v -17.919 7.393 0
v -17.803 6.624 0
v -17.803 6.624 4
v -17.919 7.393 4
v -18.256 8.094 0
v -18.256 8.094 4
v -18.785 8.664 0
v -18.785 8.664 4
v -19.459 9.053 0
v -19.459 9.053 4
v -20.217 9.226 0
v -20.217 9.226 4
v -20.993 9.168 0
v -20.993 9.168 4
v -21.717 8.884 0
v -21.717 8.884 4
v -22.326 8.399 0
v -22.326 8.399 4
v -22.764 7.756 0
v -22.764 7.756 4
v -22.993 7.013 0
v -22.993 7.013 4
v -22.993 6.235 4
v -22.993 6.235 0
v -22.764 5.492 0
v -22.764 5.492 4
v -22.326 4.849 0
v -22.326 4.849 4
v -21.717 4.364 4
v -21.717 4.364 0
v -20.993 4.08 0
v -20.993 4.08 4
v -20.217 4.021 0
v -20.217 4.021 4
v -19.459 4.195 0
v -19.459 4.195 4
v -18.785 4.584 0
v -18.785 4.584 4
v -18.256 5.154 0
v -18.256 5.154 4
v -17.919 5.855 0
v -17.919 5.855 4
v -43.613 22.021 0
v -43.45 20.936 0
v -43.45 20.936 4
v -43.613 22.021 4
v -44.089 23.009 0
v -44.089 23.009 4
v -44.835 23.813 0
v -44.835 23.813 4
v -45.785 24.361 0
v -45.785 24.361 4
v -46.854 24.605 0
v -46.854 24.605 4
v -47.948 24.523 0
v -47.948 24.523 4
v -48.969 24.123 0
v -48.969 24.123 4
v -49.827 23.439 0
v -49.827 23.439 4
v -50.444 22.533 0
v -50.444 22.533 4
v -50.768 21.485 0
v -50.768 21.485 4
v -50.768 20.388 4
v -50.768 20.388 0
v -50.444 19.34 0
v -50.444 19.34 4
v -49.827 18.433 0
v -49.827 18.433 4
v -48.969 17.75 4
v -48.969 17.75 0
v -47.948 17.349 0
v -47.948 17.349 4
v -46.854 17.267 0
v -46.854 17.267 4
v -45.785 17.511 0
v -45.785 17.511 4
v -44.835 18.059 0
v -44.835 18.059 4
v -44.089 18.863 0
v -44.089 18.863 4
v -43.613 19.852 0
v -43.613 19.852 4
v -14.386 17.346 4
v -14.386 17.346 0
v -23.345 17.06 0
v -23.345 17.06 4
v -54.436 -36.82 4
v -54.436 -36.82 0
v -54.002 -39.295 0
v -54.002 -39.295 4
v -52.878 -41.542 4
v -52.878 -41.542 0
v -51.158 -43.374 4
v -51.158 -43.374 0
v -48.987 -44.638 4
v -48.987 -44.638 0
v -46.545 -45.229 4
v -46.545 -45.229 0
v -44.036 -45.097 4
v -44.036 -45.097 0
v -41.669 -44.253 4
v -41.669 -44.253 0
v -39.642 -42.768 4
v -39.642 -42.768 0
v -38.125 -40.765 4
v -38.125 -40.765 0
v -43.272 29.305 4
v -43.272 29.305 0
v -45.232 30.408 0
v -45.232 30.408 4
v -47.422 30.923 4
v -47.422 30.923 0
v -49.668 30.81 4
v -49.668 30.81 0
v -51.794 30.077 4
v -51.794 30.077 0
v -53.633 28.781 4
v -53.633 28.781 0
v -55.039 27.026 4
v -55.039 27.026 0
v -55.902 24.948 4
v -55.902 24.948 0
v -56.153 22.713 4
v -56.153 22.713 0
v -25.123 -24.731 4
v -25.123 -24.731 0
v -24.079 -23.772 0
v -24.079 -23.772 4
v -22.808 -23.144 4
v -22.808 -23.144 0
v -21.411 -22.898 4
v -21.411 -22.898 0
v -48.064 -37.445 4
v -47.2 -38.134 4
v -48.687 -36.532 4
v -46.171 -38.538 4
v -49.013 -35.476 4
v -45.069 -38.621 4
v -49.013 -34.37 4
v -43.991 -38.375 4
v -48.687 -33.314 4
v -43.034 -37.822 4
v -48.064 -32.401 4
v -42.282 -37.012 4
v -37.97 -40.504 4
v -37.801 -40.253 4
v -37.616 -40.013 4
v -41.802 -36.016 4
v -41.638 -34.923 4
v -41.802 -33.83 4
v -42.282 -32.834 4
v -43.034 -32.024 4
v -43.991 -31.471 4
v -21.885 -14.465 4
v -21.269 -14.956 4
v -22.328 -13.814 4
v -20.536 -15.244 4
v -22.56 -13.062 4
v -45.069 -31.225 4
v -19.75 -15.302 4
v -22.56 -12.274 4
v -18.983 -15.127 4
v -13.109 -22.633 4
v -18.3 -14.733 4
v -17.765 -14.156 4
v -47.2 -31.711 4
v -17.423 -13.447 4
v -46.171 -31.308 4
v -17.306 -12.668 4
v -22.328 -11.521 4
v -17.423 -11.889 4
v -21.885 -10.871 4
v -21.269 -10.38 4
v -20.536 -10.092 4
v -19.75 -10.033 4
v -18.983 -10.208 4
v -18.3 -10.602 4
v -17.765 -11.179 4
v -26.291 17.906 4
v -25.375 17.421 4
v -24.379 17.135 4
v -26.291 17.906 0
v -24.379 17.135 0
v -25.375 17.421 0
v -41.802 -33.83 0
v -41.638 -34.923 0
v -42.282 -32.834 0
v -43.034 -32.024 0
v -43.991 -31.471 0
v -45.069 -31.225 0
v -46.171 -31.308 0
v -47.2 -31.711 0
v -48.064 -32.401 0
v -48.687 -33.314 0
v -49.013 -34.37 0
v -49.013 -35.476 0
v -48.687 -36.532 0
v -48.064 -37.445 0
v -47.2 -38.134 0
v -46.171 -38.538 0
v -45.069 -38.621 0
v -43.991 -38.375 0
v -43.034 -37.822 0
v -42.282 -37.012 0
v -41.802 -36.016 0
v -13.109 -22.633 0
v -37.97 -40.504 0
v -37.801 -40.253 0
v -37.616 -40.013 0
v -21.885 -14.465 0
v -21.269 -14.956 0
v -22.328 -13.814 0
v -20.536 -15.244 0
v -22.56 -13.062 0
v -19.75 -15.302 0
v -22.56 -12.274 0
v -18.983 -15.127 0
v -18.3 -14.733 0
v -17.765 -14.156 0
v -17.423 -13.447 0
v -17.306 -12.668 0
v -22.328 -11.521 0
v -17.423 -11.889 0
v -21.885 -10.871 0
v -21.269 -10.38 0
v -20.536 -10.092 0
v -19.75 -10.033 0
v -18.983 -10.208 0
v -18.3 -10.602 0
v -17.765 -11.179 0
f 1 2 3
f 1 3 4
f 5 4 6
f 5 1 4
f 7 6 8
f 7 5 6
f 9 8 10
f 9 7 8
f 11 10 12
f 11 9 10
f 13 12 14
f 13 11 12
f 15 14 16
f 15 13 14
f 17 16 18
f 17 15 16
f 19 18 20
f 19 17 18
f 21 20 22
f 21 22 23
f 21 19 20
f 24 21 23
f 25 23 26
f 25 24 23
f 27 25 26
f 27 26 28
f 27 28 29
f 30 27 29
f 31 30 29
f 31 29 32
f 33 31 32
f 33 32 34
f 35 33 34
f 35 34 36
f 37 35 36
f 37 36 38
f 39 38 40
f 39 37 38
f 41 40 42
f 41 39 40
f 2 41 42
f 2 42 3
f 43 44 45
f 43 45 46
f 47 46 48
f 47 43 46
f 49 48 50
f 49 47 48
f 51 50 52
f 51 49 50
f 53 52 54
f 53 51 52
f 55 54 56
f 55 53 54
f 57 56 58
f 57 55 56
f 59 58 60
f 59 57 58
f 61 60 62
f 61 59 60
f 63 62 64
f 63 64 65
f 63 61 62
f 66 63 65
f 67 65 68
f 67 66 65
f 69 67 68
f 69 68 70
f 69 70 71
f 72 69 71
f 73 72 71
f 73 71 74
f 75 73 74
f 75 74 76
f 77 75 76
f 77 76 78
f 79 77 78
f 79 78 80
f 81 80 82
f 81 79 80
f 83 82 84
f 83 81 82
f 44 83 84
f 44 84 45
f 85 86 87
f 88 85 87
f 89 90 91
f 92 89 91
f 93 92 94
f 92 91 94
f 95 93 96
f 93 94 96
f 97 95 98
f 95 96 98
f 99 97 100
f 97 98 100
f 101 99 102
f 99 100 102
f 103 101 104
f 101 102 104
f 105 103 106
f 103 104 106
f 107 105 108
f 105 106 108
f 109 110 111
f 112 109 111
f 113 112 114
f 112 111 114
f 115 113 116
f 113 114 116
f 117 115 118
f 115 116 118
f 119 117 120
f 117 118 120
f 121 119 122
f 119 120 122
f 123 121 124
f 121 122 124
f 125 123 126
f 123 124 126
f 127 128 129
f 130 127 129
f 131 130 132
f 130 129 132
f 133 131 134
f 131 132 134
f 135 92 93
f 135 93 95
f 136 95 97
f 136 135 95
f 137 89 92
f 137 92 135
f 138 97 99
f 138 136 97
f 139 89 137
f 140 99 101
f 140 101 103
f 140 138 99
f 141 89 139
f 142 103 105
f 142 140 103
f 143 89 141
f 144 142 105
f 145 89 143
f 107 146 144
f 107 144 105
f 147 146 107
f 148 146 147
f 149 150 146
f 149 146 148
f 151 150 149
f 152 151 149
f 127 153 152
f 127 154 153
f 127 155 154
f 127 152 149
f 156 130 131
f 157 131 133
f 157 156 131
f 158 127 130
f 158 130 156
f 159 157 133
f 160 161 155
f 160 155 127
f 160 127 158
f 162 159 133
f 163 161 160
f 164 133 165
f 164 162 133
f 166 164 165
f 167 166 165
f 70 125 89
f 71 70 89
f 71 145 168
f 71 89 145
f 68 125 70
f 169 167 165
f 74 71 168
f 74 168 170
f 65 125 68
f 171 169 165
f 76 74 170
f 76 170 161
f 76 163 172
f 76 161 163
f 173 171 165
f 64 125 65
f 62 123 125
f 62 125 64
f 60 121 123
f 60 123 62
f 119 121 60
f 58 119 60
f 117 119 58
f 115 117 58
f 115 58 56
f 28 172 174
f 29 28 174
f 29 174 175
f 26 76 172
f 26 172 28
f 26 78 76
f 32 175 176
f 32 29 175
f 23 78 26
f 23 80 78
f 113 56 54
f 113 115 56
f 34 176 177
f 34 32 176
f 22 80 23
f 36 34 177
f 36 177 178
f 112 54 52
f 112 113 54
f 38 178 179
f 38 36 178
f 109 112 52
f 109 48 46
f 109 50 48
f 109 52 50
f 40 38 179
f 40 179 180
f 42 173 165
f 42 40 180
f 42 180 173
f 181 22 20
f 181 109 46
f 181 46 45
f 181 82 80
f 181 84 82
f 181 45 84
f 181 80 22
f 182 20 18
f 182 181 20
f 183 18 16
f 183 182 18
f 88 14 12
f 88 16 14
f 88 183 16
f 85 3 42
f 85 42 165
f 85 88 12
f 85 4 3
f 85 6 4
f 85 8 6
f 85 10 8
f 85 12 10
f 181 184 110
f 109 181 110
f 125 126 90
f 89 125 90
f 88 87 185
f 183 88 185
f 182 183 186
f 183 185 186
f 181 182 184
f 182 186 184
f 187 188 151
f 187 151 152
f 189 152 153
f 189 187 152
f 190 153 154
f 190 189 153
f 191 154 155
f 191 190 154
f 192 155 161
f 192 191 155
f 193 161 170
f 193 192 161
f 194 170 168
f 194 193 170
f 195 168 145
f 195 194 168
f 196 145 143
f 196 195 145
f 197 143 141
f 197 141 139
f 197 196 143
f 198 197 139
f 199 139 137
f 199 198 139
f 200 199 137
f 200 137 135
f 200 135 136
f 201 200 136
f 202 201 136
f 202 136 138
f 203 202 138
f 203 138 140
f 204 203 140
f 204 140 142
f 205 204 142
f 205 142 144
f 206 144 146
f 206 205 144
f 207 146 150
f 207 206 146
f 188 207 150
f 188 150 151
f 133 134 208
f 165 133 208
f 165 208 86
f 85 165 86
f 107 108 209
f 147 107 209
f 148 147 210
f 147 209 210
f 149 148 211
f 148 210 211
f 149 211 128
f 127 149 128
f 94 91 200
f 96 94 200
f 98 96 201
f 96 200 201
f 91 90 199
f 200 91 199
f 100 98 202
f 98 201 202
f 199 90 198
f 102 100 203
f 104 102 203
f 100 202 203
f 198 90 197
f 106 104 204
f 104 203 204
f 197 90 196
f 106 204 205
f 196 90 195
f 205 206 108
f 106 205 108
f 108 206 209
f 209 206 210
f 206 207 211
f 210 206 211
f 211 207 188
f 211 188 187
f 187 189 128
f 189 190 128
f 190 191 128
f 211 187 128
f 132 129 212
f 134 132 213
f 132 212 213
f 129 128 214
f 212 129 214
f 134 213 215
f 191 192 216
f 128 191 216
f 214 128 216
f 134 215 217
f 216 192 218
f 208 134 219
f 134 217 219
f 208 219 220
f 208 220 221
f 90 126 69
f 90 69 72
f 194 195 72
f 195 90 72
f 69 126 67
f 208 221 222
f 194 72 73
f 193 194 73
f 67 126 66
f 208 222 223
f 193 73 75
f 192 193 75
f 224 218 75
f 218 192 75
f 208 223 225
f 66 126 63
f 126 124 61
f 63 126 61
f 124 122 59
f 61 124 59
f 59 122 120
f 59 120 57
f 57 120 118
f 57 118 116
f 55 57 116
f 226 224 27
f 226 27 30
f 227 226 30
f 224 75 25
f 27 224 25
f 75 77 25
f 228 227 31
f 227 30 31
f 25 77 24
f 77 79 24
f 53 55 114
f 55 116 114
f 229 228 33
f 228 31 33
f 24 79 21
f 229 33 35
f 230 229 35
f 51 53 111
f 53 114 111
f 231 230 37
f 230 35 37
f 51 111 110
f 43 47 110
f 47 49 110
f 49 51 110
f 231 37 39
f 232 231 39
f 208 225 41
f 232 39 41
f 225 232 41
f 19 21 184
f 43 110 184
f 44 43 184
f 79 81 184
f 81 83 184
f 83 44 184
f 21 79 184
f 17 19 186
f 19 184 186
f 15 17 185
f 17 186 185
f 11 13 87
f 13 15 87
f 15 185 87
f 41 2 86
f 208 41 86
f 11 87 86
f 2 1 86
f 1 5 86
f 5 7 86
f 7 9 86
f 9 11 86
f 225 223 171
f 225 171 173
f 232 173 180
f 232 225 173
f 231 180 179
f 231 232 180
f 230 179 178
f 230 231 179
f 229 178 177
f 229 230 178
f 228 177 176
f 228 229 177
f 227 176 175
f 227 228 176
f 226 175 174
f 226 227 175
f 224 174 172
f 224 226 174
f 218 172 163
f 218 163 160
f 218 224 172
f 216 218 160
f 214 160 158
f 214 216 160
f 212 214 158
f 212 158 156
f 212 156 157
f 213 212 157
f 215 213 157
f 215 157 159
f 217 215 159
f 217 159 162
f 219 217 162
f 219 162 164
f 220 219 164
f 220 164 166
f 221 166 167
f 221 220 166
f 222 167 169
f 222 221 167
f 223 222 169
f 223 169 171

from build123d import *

# Parameters (mm, degrees)
F0_R     = 3.708309
F0_R_2   = 2.642108
F0_R_3   = 3.67947
F0_R_4   = 2.609813
F1_DEPTH = 4


with BuildPart() as f1:
    # F0 (on Top) → F1 (new body)
    with BuildSketch(Plane.XY):
        with BuildLine():
            Line((-21.411486, -22.898418), (-13.109211, -22.633235))
            Line((-13.109211, -22.633235), (-14.386204, 17.346376))
            Line((-14.386204, 17.346376), (-23.344903, 17.060226))
            ThreePointArc((-23.344903, 17.060226), (-24.884447, 17.251866), (-26.291138, 17.906195))
            Line((-26.291138, 17.906195), (-43.272432, 29.304598))
            ThreePointArc((-43.272432, 29.304598), (-51.794147, 30.076603), (-56.15294, 22.713415))
            Line((-56.15294, 22.713415), (-54.436188, -36.819749))
            ThreePointArc((-54.436188, -36.819749), (-47.787351, -45.022515), (-38.124586, -40.76536))
            ThreePointArc((-38.124586, -40.76536), (-37.887462, -40.377688), (-37.616119, -40.013148))
            Line((-37.616119, -40.013148), (-25.122912, -24.731226))
            ThreePointArc((-25.122912, -24.731226), (-23.465768, -23.412721), (-21.411486, -22.898418))
        make_face()
        with Locations((-45.345975, -34.922893)):
            Circle(F0_R, mode=Mode.SUBTRACT)
        with Locations((-19.947813, -12.667741)):
            Circle(F0_R_2, mode=Mode.SUBTRACT)
        with Locations((-47.129278, 20.936157)):
            Circle(F0_R_3, mode=Mode.SUBTRACT)
        with Locations((-20.412468, 6.623971)):
            Circle(F0_R_4, mode=Mode.SUBTRACT)
    extrude(amount=F1_DEPTH)


solid = f1.part
